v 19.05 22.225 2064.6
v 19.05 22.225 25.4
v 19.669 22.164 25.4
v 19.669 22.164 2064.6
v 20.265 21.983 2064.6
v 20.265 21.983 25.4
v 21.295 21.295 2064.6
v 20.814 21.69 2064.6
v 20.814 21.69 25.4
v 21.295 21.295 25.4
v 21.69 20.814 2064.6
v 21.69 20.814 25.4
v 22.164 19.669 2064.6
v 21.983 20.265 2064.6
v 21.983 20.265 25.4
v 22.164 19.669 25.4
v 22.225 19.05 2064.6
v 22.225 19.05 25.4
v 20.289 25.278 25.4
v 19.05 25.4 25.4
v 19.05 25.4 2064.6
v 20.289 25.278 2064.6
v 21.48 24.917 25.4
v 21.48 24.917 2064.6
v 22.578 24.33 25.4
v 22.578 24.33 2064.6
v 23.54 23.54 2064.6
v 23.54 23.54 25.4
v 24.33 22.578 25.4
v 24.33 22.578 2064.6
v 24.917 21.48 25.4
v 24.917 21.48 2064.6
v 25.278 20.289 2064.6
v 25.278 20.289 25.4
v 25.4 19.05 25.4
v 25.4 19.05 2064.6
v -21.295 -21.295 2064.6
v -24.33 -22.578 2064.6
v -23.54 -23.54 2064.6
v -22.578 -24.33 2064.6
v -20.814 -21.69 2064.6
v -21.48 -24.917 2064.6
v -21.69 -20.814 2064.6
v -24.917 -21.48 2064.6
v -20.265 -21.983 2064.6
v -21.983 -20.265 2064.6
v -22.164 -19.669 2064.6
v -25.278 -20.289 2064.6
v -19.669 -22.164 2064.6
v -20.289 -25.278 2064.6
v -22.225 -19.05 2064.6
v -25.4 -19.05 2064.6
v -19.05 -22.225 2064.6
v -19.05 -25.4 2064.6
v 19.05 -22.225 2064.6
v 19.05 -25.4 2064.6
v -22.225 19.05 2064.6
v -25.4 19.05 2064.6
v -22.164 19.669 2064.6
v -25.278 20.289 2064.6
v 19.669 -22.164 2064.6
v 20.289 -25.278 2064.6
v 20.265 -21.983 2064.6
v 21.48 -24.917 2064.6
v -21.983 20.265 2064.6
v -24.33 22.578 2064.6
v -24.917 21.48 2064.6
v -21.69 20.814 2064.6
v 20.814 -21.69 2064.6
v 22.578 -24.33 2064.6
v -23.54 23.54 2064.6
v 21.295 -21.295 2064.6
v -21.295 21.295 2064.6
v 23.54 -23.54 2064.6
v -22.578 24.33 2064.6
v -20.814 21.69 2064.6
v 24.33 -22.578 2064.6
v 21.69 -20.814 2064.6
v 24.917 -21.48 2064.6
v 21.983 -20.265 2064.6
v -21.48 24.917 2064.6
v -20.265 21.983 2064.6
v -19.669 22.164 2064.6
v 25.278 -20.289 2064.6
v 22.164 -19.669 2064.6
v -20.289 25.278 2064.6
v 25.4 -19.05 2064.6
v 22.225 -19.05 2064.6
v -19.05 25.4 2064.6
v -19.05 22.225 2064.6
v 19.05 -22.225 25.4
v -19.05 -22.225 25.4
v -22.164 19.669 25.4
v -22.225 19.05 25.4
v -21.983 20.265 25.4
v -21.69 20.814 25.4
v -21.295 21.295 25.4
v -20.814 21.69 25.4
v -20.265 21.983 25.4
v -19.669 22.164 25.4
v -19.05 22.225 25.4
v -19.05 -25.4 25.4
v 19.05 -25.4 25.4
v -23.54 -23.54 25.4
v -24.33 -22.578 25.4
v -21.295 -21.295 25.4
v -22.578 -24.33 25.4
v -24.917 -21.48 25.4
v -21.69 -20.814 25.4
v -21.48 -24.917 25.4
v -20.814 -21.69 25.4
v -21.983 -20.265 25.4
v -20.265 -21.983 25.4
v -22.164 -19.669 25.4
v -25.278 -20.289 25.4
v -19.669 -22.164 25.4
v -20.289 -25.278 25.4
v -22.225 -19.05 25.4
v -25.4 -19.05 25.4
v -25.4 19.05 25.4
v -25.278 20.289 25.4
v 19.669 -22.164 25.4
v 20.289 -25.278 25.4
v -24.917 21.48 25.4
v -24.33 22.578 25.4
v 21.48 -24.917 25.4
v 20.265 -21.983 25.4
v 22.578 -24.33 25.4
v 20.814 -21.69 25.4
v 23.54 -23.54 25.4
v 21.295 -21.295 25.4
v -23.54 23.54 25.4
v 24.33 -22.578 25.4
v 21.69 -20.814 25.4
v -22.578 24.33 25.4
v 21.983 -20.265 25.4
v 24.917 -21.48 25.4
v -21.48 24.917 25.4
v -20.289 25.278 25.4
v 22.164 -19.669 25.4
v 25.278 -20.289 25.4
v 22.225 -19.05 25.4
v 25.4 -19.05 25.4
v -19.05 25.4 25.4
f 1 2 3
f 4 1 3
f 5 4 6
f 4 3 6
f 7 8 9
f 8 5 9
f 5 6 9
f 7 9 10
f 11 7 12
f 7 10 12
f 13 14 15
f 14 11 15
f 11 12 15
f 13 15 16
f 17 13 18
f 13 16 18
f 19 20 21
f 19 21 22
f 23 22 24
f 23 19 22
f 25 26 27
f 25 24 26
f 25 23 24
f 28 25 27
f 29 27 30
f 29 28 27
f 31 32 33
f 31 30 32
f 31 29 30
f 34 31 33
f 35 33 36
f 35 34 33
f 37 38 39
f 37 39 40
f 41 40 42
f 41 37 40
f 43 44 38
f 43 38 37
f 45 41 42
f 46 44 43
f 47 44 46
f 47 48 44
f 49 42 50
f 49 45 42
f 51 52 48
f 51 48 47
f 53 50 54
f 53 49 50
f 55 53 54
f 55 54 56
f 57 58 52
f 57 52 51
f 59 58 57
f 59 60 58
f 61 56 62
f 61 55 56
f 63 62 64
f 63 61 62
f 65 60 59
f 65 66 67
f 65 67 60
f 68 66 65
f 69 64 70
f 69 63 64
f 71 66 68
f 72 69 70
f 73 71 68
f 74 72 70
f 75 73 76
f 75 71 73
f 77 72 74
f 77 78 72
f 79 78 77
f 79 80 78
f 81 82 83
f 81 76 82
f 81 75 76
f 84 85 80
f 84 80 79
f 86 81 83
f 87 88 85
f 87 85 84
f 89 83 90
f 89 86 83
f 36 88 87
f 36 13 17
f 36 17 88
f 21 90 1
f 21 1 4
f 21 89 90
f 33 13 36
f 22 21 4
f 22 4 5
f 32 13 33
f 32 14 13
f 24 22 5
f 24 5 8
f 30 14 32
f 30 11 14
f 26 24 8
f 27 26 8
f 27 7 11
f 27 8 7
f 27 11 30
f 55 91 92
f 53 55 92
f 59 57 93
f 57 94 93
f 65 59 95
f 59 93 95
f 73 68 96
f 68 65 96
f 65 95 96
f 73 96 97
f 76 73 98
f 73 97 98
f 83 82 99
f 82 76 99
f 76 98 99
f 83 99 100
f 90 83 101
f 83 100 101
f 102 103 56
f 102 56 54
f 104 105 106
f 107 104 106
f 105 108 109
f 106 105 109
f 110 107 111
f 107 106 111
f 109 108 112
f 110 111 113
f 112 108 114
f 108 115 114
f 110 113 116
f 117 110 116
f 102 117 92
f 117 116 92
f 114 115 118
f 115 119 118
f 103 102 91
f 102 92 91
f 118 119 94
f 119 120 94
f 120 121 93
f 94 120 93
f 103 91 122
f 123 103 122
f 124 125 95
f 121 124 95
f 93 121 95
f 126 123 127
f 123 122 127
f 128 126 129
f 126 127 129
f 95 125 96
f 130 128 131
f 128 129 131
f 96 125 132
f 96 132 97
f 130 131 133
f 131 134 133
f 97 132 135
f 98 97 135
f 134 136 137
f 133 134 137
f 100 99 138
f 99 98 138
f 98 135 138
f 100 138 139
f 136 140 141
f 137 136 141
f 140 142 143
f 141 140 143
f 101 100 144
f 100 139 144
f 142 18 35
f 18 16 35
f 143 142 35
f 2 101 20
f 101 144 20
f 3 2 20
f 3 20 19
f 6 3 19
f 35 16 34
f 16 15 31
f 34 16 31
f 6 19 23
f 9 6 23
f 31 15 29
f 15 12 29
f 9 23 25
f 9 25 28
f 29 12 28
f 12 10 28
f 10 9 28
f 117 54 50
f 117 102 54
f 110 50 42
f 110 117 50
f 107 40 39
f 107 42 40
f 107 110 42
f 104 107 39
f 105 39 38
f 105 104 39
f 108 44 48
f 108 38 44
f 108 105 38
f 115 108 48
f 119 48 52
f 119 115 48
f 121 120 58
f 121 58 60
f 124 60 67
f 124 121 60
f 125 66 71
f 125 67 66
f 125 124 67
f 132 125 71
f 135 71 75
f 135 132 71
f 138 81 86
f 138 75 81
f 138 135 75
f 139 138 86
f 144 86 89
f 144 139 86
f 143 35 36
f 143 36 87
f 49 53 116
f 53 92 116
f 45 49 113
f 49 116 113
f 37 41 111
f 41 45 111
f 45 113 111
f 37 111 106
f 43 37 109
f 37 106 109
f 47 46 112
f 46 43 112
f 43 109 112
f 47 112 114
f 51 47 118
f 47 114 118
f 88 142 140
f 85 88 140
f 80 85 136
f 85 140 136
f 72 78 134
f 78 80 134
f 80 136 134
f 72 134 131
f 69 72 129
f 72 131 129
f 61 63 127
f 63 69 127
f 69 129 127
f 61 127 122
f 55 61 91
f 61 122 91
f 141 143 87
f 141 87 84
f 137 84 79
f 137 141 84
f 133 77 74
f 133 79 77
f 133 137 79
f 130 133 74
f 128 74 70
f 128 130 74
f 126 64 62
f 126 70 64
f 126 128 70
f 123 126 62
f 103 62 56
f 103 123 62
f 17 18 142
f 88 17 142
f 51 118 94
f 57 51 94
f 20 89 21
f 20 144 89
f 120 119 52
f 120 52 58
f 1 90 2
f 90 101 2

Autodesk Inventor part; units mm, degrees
ref_plane "Plano inicial" through (0, 0, 25.4) normal (0, 0, 1) x (1, 0, 0)
ref_plane "Plano final" through (0, 0, 2064.6) normal (0, 0, 1) x (1, 0, 0)
sketch "Boceto" plane through (0, 0, 0) normal (0, 0, 1) x (1, 0, 0)
  line L0 (-25.4, -19.05) -> (-25.4, 19.05)
  line L1 (-19.05, 25.4) -> (19.05, 25.4)
  line L2 (25.4, 19.05) -> (25.4, -19.05)
  line L3 (19.05, -25.4) -> (-19.05, -25.4)
  arc A0 (-25.4, -19.05) -> (-19.05, -25.4) centre (-19.05, -19.05) ccw
  arc A1 (-19.05, 25.4) -> (-25.4, 19.05) centre (-19.05, 19.05) ccw
  arc A2 (25.4, 19.05) -> (19.05, 25.4) centre (19.05, 19.05) ccw
  arc A3 (19.05, -25.4) -> (25.4, -19.05) centre (19.05, -19.05) ccw
  arc A4 (-19.05, 22.225) -> (-22.225, 19.05) centre (-19.05, 19.05) ccw
  line L4 (-19.05, 22.225) -> (19.05, 22.225)
  arc A5 (22.225, 19.05) -> (19.05, 22.225) centre (19.05, 19.05) ccw
  line L5 (22.225, 19.05) -> (22.225, -19.05)
  arc A6 (19.05, -22.225) -> (22.225, -19.05) centre (19.05, -19.05) ccw
  line L6 (19.05, -22.225) -> (-19.05, -22.225)
  arc A7 (-22.225, -19.05) -> (-19.05, -22.225) centre (-19.05, -19.05) ccw
  line L7 (-22.225, -19.05) -> (-22.225, 19.05)
  line L8 (0, 37.4012) -> (0, -37.4012) construction
  line L9 (-37.4012, 0) -> (37.4012, 0) construction
  dimension "d10" = 50.8
  dimension "d11" = 50.8
  dimension "d12" = 3.175
  dimension "d15" = 25.4
  dimension "d16" = 25.4
  dimension "d17" = 6.35
extrude "Cuerpo" add sketch "Boceto" along normal up to surface (2039.2 mm away) from surface at 25.4
sketch "Sketch3" plane through (0, 0, 0) normal (0, 0, 1) x (1, 0, 0)
  line L0 (0, 0) -> (10, 0)
ref_plane "Work Plane3" through (0, 0, 0) normal (0, -1, 0) x (1, 0, 0)
ref_plane "Plano de trabajo4" through (-19.05, 1700, 25.4) normal (0, 0, -1) x (-1, 0, 0)
split "Dividir1" plane through (-19.05, 1700, 25.4) removes the side toward (0, 0, -1)
ref_plane "Plano de trabajo5" through (19.05, 1700, 2064.6) normal (0, 0, 1) x (1, 0, 0)
split "Dividir2" plane through (19.05, 1700, 2064.6) removes the side toward (0, 0, 1)
sketch "Sketch4" plane through (0, 0, 0) normal (0, -1, 0) x (1, 0, 0)
  line L0 (-2, 25.4) -> (12, 25.4) projected
  line L1 (-2, 2064.6) -> (12, 2064.6) projected
  dimension "d19" = 2039.2
equation "\"d10\" = G_H"
equation "\"d11\" = G_W"
equation "\"d12\" = G_T"
equation "\"d15\" = 0.5 * d10"
equation "\"d16\" = 0.5 * d11"
equation "\"d17\" = G_IR"
equation "\"d3\" = G_L"
equation "\"G_W\" = 50.8"
equation "\"G_H\" = 50.8"
equation "\"G_T\" = 3.175"
equation "\"G_IR\" = 6.35"
equation "\"G_L\" = d19"
equation "\"G_OFFSET_START\" = -25.4"
equation "\"G_OFFSET_END\" = -25.4"
equation "\"d13\" = -G_OFFSET_START"
equation "\"d14\" = G_OFFSET_END + B_L"
equation "\"B_L\" = 2090"
properties part number "AISC - 2 x 2 x 1/8 - 80,283" material "Acero, suave"
